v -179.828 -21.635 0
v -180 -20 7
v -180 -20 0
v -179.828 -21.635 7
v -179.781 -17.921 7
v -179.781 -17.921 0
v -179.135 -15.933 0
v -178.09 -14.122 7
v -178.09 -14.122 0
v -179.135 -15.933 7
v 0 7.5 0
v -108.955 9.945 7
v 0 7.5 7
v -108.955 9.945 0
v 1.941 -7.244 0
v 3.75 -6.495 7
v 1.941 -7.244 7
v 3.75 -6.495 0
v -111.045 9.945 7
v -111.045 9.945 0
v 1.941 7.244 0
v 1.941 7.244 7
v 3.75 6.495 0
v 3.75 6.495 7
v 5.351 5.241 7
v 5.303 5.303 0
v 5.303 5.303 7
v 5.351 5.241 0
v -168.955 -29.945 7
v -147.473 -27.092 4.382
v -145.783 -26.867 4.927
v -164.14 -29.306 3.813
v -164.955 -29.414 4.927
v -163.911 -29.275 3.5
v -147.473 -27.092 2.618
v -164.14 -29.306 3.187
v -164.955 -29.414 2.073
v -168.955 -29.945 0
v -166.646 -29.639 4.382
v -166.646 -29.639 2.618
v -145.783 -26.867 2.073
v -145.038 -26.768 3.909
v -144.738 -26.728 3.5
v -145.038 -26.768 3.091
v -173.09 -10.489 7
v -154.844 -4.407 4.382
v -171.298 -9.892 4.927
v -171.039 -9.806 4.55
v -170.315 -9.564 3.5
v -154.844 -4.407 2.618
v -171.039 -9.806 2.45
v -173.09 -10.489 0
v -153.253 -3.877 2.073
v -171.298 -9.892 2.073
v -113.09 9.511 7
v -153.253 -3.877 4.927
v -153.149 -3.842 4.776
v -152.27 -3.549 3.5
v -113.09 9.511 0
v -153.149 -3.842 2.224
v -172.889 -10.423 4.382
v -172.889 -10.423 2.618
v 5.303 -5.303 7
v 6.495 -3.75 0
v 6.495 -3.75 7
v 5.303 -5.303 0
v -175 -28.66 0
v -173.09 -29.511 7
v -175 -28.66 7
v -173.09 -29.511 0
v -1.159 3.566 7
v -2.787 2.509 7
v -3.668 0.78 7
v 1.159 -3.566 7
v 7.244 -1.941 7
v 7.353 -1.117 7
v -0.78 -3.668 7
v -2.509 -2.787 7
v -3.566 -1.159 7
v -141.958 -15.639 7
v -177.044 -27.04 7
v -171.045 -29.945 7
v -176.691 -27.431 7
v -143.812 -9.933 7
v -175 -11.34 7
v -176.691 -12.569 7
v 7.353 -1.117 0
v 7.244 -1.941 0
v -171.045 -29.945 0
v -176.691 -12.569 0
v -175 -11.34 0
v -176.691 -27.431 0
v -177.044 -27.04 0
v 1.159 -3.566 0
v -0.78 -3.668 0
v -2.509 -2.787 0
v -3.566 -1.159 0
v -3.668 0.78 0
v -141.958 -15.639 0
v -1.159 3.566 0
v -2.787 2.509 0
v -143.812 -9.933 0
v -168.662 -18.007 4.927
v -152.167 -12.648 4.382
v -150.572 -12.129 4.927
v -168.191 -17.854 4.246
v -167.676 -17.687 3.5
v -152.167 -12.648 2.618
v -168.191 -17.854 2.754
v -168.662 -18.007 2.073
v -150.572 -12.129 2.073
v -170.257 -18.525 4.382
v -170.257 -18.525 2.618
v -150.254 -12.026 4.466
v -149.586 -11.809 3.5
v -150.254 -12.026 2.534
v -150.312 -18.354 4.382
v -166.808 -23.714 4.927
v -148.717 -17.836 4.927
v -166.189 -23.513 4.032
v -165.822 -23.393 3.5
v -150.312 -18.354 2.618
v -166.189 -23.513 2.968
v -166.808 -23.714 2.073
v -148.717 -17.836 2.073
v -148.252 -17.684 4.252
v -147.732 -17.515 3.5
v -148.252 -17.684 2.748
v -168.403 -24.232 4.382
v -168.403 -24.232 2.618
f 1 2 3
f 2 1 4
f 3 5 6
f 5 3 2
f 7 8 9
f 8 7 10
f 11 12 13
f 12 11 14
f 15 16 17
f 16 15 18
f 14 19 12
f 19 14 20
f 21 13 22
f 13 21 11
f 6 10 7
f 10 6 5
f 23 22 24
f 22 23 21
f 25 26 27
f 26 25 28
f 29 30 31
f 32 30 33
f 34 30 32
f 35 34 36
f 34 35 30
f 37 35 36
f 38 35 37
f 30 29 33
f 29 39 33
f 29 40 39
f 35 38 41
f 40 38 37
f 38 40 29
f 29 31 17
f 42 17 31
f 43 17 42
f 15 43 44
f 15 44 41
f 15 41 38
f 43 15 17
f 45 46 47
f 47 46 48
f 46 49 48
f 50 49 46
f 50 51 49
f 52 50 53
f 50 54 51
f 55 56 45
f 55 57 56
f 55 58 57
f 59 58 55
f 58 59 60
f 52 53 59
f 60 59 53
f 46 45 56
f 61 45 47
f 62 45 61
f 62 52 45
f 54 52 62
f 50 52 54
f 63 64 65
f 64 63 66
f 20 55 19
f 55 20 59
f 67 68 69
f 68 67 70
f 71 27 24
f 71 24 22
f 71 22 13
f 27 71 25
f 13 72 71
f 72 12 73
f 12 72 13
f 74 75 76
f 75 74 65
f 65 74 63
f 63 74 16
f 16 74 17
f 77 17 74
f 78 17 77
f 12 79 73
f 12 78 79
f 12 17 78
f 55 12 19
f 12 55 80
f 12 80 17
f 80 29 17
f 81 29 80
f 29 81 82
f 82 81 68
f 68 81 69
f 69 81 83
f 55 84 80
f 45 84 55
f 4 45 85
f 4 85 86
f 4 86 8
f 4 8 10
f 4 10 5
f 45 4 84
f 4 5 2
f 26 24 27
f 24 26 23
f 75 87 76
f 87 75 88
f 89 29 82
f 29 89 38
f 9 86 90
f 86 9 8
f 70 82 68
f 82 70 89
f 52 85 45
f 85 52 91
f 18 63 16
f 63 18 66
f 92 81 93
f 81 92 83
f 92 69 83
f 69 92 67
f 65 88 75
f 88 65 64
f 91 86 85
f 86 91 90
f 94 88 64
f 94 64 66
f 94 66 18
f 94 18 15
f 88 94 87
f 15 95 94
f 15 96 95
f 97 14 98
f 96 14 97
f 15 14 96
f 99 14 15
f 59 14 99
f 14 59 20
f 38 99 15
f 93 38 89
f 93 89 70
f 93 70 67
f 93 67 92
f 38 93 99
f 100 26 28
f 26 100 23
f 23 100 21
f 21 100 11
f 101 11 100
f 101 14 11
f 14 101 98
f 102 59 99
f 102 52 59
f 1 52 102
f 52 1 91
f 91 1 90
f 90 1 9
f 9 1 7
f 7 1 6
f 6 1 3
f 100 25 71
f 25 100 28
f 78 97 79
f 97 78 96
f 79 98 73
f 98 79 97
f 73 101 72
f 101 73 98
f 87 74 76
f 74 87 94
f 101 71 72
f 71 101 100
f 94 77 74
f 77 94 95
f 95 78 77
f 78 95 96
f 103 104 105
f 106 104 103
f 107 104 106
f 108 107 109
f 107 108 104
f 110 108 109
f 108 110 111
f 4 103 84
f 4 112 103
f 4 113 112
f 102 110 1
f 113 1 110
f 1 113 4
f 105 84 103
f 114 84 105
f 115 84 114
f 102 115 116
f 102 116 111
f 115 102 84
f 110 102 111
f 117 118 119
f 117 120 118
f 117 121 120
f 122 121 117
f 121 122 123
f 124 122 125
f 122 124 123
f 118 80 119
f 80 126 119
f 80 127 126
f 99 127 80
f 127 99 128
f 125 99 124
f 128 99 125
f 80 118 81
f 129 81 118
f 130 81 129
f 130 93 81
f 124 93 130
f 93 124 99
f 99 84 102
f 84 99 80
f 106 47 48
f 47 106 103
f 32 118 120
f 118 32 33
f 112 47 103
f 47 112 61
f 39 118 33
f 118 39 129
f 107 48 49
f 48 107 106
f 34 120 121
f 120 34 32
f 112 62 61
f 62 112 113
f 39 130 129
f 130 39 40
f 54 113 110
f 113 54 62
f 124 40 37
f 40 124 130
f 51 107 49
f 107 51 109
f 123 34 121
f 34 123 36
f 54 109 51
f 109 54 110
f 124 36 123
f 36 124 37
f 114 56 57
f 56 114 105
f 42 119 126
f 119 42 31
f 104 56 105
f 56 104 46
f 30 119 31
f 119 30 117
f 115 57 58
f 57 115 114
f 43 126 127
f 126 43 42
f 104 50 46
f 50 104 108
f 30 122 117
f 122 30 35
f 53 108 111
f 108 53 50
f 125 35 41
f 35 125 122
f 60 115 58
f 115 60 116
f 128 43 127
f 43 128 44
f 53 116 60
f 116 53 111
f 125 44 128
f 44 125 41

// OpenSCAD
difference(){
	hull(){
		cylinder(r=15/2,h=7);
		translate([-110,0,0])cylinder(r=20/2,h=7);
		translate([-110-40+10-30,-20,0])cylinder(r=20/2,h=7);
	}
	translate([0,0,-1])
	rotate([0,0,18])
	hull(){
		cylinder(r=7.5/2,h=10);
		translate([20,0,0])cylinder(r=5/2,h=10);
	}
	
	translate([-40-110-10-15-5,-6/2-20-5,-1])rotate([0,0,18])cube([40,6,10]);
	
	



	translate([-125-40-10,0,7/2])rotate([90,0,18])cylinder(r=3/2,h=40);
	translate([-125-40+10,0,7/2])rotate([90,0,18])cylinder(r=3/2,h=40);
}
